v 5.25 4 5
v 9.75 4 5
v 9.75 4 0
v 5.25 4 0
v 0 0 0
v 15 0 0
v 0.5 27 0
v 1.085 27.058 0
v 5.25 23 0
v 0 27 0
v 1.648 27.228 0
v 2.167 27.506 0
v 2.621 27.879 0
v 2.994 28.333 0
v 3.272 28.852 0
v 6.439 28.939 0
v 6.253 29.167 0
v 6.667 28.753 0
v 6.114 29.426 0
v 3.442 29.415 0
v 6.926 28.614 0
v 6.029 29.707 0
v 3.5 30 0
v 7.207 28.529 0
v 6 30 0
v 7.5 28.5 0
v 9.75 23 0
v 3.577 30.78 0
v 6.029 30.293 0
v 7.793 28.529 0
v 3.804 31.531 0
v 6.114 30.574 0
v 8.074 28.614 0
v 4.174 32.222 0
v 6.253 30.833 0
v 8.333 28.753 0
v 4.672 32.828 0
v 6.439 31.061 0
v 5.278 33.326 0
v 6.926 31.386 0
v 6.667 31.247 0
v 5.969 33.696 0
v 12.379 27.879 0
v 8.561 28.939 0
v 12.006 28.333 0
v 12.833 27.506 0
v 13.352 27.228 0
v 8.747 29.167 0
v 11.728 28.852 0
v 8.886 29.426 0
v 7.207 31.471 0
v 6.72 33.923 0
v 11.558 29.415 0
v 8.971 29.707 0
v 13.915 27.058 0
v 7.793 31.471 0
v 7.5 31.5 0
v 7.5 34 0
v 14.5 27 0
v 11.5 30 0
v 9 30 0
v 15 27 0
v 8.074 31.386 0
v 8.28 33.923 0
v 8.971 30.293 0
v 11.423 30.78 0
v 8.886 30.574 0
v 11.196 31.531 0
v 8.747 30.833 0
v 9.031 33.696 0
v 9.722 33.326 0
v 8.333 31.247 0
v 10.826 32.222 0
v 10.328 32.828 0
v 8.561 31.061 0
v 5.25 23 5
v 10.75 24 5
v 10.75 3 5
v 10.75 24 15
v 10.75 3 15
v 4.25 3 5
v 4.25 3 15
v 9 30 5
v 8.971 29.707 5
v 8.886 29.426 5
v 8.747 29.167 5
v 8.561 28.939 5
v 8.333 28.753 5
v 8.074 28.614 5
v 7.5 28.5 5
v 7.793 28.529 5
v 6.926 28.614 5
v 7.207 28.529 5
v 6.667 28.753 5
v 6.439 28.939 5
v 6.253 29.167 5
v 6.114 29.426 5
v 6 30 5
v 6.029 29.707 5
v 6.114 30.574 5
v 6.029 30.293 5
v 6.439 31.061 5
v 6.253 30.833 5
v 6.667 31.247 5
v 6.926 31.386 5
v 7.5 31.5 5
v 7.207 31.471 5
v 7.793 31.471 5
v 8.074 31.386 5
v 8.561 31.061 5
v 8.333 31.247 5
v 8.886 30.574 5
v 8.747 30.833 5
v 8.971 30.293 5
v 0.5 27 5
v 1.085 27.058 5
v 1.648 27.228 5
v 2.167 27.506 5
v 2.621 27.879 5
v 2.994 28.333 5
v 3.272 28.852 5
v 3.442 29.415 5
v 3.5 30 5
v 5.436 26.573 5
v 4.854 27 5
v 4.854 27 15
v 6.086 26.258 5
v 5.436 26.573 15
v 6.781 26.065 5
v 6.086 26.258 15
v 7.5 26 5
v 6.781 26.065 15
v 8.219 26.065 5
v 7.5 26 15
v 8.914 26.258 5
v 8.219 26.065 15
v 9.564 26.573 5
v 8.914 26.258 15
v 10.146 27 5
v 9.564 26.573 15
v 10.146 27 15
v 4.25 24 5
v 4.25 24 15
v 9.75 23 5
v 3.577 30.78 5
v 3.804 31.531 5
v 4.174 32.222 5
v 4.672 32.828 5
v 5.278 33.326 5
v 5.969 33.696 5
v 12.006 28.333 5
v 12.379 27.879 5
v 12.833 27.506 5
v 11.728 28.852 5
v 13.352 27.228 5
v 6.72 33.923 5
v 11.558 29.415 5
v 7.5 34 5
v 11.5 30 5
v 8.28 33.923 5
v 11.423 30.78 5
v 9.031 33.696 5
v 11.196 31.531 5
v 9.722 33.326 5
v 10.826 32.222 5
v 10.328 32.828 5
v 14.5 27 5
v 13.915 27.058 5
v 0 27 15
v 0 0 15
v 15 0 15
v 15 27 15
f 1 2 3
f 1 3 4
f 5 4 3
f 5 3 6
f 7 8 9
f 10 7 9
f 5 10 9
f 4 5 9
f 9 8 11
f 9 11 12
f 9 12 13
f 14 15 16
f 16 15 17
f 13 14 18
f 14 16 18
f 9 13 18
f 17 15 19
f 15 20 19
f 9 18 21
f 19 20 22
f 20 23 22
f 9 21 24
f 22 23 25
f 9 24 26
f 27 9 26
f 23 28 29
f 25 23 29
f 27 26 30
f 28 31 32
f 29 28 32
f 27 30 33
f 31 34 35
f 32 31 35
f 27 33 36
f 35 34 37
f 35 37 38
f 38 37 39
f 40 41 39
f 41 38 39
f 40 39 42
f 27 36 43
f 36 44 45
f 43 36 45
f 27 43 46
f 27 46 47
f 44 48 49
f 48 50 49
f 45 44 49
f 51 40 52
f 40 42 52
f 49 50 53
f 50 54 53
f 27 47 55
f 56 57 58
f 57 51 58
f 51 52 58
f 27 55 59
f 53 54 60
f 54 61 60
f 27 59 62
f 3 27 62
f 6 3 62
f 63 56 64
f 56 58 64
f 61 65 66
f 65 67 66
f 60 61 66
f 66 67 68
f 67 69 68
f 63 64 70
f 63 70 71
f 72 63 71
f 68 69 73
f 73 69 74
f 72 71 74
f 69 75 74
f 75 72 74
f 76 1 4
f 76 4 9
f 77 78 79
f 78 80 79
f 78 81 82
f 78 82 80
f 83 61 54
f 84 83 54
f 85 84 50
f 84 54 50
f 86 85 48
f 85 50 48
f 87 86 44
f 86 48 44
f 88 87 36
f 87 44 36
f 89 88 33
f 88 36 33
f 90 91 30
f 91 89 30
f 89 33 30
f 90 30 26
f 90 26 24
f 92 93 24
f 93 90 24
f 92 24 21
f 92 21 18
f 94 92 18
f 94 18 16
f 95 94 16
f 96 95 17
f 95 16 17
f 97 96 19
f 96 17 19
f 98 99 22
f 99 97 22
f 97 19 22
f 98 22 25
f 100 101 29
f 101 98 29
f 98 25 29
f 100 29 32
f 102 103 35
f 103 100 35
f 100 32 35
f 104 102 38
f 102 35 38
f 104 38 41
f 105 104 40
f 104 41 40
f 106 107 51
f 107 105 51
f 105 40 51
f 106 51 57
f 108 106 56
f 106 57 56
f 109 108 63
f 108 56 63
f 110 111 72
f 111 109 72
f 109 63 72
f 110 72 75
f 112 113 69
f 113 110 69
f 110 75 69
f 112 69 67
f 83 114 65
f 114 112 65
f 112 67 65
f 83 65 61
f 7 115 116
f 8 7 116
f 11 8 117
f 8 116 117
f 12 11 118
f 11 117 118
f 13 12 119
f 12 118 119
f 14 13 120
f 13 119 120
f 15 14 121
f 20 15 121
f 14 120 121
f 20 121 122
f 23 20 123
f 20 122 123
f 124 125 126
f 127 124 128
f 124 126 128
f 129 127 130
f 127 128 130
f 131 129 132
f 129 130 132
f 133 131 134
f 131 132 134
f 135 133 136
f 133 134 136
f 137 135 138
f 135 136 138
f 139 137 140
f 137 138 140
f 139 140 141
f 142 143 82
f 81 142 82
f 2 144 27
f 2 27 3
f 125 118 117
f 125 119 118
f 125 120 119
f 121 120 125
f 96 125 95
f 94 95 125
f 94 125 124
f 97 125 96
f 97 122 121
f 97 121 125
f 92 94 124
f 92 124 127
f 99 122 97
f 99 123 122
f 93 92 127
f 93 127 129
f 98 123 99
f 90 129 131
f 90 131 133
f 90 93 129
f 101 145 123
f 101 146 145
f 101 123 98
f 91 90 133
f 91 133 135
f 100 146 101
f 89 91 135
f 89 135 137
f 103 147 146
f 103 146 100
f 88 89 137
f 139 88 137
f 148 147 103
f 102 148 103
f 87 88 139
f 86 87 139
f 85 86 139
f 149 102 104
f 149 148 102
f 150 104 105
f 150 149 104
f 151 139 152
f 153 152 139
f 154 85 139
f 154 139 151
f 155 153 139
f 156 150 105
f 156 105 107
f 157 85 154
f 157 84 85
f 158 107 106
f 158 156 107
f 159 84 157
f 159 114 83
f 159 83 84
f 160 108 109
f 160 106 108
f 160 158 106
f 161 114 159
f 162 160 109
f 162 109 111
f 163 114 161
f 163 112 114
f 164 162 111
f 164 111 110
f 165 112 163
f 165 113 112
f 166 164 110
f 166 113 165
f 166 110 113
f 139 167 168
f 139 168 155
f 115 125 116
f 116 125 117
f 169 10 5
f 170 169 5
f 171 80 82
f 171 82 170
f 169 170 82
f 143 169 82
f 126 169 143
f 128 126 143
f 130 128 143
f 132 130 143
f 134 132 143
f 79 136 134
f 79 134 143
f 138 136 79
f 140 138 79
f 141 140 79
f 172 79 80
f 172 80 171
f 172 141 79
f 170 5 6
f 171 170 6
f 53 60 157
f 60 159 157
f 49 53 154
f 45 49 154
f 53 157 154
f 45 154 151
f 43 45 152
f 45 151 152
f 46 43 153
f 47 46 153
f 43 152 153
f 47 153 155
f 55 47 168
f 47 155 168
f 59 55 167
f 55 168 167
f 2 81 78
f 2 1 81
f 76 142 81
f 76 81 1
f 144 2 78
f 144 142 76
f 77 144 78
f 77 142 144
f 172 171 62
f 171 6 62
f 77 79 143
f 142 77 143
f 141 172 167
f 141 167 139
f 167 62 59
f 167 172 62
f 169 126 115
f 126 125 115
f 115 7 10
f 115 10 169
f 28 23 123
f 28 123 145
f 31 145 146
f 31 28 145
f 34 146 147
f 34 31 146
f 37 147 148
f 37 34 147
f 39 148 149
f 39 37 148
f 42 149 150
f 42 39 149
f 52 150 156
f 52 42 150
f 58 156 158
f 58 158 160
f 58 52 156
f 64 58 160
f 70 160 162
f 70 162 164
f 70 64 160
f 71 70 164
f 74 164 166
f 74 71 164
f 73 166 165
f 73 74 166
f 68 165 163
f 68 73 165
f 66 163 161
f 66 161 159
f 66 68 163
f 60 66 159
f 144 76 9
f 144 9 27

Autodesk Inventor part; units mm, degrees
ref_plane "YZ Plane" through (0, 0, 0) normal (1, 0, 0) x (0, 1, 0)
ref_plane "XZ Plane" through (0, 0, 0) normal (0, 1, 0) x (-1, 0, 0)
ref_plane "XY Plane" through (0, 0, 0) normal (0, 0, 1) x (1, 0, 0)
sketch "Sketch1" plane through (0, 0, 0) normal (0, 0, 1) x (1, 0, 0)
  line L0 (0, 0) -> (15, 0)
  line L1 (15, 0) -> (15, 27)
  line L2 (15, 27) -> (0, 27)
  line L3 (0, 27) -> (0, 0)
  circle A0 centre (7.5, 30) radius 4
  circle A1 centre (7.5, 30) radius 1.5
  point P0 (7.5, 27)
  dimension "d2" = 15
  dimension "d3" = 27
  dimension "d7" = 8
  dimension "d8" = 3
  dimension "d9" = 3
extrude "Extrusion1" add sketch "Sketch1" along normal blind 15
sketch "Sketch2" plane through (0, 0, 15) normal (0, 0, 1) x (1, 0, 0)
  circle A0 centre (7.5, 30) radius 1.5
  line L0 (0, 27) -> (0, 0)
  line L1 (0, 0) -> (15, 0)
  line L2 (15, 0) -> (15, 27)
  circle A1 centre (7.5, 30) radius 4
  arc A2 (10.1458, 27) -> (4.8542, 27) centre (7.5, 30) ccw
  line L3 (4.25, 3) -> (10.75, 3)
  line L4 (10.75, 3) -> (10.75, 24)
  line L5 (10.75, 24) -> (4.25, 24)
  line L6 (4.25, 24) -> (4.25, 3)
  point P0 (11.4441, 29.3333)
  point P1 (3.5559, 29.3333)
  point P2 (10.75, 13.5)
  point P3 (15, 13.5)
  point P4 (7.5, 3)
  point P5 (7.5, 0)
  dimension "d14" = 6.5
  dimension "d16" = 21
extrude "Extrusion2" cut sketch "Sketch2" against normal blind 10
fillet "Fillet2" radius 3 2 edges at (10.1458, 27, 2.5) (4.8542, 27, 2.5)
sketch "Sketch3" plane through (0, 0, 5) normal (0, 0, 1) x (1, 0, 0)
  line L0 (10.75, 3) -> (4.25, 3) construction
  line L1 (10.75, 24) -> (10.75, 3) construction
  line L2 (4.25, 24) -> (10.75, 24) construction
  line L3 (4.25, 3) -> (4.25, 24) construction
  line L4 (5.25, 23) -> (9.75, 23)
  line L5 (9.75, 23) -> (9.75, 4)
  line L6 (9.75, 4) -> (5.25, 4)
  line L7 (5.25, 4) -> (5.25, 23)
  point P0 (0, 0)
  dimension "d20" = 1
extrude "Extrusion3" cut sketch "Sketch3" against normal blind 10
properties part number "relay1"
